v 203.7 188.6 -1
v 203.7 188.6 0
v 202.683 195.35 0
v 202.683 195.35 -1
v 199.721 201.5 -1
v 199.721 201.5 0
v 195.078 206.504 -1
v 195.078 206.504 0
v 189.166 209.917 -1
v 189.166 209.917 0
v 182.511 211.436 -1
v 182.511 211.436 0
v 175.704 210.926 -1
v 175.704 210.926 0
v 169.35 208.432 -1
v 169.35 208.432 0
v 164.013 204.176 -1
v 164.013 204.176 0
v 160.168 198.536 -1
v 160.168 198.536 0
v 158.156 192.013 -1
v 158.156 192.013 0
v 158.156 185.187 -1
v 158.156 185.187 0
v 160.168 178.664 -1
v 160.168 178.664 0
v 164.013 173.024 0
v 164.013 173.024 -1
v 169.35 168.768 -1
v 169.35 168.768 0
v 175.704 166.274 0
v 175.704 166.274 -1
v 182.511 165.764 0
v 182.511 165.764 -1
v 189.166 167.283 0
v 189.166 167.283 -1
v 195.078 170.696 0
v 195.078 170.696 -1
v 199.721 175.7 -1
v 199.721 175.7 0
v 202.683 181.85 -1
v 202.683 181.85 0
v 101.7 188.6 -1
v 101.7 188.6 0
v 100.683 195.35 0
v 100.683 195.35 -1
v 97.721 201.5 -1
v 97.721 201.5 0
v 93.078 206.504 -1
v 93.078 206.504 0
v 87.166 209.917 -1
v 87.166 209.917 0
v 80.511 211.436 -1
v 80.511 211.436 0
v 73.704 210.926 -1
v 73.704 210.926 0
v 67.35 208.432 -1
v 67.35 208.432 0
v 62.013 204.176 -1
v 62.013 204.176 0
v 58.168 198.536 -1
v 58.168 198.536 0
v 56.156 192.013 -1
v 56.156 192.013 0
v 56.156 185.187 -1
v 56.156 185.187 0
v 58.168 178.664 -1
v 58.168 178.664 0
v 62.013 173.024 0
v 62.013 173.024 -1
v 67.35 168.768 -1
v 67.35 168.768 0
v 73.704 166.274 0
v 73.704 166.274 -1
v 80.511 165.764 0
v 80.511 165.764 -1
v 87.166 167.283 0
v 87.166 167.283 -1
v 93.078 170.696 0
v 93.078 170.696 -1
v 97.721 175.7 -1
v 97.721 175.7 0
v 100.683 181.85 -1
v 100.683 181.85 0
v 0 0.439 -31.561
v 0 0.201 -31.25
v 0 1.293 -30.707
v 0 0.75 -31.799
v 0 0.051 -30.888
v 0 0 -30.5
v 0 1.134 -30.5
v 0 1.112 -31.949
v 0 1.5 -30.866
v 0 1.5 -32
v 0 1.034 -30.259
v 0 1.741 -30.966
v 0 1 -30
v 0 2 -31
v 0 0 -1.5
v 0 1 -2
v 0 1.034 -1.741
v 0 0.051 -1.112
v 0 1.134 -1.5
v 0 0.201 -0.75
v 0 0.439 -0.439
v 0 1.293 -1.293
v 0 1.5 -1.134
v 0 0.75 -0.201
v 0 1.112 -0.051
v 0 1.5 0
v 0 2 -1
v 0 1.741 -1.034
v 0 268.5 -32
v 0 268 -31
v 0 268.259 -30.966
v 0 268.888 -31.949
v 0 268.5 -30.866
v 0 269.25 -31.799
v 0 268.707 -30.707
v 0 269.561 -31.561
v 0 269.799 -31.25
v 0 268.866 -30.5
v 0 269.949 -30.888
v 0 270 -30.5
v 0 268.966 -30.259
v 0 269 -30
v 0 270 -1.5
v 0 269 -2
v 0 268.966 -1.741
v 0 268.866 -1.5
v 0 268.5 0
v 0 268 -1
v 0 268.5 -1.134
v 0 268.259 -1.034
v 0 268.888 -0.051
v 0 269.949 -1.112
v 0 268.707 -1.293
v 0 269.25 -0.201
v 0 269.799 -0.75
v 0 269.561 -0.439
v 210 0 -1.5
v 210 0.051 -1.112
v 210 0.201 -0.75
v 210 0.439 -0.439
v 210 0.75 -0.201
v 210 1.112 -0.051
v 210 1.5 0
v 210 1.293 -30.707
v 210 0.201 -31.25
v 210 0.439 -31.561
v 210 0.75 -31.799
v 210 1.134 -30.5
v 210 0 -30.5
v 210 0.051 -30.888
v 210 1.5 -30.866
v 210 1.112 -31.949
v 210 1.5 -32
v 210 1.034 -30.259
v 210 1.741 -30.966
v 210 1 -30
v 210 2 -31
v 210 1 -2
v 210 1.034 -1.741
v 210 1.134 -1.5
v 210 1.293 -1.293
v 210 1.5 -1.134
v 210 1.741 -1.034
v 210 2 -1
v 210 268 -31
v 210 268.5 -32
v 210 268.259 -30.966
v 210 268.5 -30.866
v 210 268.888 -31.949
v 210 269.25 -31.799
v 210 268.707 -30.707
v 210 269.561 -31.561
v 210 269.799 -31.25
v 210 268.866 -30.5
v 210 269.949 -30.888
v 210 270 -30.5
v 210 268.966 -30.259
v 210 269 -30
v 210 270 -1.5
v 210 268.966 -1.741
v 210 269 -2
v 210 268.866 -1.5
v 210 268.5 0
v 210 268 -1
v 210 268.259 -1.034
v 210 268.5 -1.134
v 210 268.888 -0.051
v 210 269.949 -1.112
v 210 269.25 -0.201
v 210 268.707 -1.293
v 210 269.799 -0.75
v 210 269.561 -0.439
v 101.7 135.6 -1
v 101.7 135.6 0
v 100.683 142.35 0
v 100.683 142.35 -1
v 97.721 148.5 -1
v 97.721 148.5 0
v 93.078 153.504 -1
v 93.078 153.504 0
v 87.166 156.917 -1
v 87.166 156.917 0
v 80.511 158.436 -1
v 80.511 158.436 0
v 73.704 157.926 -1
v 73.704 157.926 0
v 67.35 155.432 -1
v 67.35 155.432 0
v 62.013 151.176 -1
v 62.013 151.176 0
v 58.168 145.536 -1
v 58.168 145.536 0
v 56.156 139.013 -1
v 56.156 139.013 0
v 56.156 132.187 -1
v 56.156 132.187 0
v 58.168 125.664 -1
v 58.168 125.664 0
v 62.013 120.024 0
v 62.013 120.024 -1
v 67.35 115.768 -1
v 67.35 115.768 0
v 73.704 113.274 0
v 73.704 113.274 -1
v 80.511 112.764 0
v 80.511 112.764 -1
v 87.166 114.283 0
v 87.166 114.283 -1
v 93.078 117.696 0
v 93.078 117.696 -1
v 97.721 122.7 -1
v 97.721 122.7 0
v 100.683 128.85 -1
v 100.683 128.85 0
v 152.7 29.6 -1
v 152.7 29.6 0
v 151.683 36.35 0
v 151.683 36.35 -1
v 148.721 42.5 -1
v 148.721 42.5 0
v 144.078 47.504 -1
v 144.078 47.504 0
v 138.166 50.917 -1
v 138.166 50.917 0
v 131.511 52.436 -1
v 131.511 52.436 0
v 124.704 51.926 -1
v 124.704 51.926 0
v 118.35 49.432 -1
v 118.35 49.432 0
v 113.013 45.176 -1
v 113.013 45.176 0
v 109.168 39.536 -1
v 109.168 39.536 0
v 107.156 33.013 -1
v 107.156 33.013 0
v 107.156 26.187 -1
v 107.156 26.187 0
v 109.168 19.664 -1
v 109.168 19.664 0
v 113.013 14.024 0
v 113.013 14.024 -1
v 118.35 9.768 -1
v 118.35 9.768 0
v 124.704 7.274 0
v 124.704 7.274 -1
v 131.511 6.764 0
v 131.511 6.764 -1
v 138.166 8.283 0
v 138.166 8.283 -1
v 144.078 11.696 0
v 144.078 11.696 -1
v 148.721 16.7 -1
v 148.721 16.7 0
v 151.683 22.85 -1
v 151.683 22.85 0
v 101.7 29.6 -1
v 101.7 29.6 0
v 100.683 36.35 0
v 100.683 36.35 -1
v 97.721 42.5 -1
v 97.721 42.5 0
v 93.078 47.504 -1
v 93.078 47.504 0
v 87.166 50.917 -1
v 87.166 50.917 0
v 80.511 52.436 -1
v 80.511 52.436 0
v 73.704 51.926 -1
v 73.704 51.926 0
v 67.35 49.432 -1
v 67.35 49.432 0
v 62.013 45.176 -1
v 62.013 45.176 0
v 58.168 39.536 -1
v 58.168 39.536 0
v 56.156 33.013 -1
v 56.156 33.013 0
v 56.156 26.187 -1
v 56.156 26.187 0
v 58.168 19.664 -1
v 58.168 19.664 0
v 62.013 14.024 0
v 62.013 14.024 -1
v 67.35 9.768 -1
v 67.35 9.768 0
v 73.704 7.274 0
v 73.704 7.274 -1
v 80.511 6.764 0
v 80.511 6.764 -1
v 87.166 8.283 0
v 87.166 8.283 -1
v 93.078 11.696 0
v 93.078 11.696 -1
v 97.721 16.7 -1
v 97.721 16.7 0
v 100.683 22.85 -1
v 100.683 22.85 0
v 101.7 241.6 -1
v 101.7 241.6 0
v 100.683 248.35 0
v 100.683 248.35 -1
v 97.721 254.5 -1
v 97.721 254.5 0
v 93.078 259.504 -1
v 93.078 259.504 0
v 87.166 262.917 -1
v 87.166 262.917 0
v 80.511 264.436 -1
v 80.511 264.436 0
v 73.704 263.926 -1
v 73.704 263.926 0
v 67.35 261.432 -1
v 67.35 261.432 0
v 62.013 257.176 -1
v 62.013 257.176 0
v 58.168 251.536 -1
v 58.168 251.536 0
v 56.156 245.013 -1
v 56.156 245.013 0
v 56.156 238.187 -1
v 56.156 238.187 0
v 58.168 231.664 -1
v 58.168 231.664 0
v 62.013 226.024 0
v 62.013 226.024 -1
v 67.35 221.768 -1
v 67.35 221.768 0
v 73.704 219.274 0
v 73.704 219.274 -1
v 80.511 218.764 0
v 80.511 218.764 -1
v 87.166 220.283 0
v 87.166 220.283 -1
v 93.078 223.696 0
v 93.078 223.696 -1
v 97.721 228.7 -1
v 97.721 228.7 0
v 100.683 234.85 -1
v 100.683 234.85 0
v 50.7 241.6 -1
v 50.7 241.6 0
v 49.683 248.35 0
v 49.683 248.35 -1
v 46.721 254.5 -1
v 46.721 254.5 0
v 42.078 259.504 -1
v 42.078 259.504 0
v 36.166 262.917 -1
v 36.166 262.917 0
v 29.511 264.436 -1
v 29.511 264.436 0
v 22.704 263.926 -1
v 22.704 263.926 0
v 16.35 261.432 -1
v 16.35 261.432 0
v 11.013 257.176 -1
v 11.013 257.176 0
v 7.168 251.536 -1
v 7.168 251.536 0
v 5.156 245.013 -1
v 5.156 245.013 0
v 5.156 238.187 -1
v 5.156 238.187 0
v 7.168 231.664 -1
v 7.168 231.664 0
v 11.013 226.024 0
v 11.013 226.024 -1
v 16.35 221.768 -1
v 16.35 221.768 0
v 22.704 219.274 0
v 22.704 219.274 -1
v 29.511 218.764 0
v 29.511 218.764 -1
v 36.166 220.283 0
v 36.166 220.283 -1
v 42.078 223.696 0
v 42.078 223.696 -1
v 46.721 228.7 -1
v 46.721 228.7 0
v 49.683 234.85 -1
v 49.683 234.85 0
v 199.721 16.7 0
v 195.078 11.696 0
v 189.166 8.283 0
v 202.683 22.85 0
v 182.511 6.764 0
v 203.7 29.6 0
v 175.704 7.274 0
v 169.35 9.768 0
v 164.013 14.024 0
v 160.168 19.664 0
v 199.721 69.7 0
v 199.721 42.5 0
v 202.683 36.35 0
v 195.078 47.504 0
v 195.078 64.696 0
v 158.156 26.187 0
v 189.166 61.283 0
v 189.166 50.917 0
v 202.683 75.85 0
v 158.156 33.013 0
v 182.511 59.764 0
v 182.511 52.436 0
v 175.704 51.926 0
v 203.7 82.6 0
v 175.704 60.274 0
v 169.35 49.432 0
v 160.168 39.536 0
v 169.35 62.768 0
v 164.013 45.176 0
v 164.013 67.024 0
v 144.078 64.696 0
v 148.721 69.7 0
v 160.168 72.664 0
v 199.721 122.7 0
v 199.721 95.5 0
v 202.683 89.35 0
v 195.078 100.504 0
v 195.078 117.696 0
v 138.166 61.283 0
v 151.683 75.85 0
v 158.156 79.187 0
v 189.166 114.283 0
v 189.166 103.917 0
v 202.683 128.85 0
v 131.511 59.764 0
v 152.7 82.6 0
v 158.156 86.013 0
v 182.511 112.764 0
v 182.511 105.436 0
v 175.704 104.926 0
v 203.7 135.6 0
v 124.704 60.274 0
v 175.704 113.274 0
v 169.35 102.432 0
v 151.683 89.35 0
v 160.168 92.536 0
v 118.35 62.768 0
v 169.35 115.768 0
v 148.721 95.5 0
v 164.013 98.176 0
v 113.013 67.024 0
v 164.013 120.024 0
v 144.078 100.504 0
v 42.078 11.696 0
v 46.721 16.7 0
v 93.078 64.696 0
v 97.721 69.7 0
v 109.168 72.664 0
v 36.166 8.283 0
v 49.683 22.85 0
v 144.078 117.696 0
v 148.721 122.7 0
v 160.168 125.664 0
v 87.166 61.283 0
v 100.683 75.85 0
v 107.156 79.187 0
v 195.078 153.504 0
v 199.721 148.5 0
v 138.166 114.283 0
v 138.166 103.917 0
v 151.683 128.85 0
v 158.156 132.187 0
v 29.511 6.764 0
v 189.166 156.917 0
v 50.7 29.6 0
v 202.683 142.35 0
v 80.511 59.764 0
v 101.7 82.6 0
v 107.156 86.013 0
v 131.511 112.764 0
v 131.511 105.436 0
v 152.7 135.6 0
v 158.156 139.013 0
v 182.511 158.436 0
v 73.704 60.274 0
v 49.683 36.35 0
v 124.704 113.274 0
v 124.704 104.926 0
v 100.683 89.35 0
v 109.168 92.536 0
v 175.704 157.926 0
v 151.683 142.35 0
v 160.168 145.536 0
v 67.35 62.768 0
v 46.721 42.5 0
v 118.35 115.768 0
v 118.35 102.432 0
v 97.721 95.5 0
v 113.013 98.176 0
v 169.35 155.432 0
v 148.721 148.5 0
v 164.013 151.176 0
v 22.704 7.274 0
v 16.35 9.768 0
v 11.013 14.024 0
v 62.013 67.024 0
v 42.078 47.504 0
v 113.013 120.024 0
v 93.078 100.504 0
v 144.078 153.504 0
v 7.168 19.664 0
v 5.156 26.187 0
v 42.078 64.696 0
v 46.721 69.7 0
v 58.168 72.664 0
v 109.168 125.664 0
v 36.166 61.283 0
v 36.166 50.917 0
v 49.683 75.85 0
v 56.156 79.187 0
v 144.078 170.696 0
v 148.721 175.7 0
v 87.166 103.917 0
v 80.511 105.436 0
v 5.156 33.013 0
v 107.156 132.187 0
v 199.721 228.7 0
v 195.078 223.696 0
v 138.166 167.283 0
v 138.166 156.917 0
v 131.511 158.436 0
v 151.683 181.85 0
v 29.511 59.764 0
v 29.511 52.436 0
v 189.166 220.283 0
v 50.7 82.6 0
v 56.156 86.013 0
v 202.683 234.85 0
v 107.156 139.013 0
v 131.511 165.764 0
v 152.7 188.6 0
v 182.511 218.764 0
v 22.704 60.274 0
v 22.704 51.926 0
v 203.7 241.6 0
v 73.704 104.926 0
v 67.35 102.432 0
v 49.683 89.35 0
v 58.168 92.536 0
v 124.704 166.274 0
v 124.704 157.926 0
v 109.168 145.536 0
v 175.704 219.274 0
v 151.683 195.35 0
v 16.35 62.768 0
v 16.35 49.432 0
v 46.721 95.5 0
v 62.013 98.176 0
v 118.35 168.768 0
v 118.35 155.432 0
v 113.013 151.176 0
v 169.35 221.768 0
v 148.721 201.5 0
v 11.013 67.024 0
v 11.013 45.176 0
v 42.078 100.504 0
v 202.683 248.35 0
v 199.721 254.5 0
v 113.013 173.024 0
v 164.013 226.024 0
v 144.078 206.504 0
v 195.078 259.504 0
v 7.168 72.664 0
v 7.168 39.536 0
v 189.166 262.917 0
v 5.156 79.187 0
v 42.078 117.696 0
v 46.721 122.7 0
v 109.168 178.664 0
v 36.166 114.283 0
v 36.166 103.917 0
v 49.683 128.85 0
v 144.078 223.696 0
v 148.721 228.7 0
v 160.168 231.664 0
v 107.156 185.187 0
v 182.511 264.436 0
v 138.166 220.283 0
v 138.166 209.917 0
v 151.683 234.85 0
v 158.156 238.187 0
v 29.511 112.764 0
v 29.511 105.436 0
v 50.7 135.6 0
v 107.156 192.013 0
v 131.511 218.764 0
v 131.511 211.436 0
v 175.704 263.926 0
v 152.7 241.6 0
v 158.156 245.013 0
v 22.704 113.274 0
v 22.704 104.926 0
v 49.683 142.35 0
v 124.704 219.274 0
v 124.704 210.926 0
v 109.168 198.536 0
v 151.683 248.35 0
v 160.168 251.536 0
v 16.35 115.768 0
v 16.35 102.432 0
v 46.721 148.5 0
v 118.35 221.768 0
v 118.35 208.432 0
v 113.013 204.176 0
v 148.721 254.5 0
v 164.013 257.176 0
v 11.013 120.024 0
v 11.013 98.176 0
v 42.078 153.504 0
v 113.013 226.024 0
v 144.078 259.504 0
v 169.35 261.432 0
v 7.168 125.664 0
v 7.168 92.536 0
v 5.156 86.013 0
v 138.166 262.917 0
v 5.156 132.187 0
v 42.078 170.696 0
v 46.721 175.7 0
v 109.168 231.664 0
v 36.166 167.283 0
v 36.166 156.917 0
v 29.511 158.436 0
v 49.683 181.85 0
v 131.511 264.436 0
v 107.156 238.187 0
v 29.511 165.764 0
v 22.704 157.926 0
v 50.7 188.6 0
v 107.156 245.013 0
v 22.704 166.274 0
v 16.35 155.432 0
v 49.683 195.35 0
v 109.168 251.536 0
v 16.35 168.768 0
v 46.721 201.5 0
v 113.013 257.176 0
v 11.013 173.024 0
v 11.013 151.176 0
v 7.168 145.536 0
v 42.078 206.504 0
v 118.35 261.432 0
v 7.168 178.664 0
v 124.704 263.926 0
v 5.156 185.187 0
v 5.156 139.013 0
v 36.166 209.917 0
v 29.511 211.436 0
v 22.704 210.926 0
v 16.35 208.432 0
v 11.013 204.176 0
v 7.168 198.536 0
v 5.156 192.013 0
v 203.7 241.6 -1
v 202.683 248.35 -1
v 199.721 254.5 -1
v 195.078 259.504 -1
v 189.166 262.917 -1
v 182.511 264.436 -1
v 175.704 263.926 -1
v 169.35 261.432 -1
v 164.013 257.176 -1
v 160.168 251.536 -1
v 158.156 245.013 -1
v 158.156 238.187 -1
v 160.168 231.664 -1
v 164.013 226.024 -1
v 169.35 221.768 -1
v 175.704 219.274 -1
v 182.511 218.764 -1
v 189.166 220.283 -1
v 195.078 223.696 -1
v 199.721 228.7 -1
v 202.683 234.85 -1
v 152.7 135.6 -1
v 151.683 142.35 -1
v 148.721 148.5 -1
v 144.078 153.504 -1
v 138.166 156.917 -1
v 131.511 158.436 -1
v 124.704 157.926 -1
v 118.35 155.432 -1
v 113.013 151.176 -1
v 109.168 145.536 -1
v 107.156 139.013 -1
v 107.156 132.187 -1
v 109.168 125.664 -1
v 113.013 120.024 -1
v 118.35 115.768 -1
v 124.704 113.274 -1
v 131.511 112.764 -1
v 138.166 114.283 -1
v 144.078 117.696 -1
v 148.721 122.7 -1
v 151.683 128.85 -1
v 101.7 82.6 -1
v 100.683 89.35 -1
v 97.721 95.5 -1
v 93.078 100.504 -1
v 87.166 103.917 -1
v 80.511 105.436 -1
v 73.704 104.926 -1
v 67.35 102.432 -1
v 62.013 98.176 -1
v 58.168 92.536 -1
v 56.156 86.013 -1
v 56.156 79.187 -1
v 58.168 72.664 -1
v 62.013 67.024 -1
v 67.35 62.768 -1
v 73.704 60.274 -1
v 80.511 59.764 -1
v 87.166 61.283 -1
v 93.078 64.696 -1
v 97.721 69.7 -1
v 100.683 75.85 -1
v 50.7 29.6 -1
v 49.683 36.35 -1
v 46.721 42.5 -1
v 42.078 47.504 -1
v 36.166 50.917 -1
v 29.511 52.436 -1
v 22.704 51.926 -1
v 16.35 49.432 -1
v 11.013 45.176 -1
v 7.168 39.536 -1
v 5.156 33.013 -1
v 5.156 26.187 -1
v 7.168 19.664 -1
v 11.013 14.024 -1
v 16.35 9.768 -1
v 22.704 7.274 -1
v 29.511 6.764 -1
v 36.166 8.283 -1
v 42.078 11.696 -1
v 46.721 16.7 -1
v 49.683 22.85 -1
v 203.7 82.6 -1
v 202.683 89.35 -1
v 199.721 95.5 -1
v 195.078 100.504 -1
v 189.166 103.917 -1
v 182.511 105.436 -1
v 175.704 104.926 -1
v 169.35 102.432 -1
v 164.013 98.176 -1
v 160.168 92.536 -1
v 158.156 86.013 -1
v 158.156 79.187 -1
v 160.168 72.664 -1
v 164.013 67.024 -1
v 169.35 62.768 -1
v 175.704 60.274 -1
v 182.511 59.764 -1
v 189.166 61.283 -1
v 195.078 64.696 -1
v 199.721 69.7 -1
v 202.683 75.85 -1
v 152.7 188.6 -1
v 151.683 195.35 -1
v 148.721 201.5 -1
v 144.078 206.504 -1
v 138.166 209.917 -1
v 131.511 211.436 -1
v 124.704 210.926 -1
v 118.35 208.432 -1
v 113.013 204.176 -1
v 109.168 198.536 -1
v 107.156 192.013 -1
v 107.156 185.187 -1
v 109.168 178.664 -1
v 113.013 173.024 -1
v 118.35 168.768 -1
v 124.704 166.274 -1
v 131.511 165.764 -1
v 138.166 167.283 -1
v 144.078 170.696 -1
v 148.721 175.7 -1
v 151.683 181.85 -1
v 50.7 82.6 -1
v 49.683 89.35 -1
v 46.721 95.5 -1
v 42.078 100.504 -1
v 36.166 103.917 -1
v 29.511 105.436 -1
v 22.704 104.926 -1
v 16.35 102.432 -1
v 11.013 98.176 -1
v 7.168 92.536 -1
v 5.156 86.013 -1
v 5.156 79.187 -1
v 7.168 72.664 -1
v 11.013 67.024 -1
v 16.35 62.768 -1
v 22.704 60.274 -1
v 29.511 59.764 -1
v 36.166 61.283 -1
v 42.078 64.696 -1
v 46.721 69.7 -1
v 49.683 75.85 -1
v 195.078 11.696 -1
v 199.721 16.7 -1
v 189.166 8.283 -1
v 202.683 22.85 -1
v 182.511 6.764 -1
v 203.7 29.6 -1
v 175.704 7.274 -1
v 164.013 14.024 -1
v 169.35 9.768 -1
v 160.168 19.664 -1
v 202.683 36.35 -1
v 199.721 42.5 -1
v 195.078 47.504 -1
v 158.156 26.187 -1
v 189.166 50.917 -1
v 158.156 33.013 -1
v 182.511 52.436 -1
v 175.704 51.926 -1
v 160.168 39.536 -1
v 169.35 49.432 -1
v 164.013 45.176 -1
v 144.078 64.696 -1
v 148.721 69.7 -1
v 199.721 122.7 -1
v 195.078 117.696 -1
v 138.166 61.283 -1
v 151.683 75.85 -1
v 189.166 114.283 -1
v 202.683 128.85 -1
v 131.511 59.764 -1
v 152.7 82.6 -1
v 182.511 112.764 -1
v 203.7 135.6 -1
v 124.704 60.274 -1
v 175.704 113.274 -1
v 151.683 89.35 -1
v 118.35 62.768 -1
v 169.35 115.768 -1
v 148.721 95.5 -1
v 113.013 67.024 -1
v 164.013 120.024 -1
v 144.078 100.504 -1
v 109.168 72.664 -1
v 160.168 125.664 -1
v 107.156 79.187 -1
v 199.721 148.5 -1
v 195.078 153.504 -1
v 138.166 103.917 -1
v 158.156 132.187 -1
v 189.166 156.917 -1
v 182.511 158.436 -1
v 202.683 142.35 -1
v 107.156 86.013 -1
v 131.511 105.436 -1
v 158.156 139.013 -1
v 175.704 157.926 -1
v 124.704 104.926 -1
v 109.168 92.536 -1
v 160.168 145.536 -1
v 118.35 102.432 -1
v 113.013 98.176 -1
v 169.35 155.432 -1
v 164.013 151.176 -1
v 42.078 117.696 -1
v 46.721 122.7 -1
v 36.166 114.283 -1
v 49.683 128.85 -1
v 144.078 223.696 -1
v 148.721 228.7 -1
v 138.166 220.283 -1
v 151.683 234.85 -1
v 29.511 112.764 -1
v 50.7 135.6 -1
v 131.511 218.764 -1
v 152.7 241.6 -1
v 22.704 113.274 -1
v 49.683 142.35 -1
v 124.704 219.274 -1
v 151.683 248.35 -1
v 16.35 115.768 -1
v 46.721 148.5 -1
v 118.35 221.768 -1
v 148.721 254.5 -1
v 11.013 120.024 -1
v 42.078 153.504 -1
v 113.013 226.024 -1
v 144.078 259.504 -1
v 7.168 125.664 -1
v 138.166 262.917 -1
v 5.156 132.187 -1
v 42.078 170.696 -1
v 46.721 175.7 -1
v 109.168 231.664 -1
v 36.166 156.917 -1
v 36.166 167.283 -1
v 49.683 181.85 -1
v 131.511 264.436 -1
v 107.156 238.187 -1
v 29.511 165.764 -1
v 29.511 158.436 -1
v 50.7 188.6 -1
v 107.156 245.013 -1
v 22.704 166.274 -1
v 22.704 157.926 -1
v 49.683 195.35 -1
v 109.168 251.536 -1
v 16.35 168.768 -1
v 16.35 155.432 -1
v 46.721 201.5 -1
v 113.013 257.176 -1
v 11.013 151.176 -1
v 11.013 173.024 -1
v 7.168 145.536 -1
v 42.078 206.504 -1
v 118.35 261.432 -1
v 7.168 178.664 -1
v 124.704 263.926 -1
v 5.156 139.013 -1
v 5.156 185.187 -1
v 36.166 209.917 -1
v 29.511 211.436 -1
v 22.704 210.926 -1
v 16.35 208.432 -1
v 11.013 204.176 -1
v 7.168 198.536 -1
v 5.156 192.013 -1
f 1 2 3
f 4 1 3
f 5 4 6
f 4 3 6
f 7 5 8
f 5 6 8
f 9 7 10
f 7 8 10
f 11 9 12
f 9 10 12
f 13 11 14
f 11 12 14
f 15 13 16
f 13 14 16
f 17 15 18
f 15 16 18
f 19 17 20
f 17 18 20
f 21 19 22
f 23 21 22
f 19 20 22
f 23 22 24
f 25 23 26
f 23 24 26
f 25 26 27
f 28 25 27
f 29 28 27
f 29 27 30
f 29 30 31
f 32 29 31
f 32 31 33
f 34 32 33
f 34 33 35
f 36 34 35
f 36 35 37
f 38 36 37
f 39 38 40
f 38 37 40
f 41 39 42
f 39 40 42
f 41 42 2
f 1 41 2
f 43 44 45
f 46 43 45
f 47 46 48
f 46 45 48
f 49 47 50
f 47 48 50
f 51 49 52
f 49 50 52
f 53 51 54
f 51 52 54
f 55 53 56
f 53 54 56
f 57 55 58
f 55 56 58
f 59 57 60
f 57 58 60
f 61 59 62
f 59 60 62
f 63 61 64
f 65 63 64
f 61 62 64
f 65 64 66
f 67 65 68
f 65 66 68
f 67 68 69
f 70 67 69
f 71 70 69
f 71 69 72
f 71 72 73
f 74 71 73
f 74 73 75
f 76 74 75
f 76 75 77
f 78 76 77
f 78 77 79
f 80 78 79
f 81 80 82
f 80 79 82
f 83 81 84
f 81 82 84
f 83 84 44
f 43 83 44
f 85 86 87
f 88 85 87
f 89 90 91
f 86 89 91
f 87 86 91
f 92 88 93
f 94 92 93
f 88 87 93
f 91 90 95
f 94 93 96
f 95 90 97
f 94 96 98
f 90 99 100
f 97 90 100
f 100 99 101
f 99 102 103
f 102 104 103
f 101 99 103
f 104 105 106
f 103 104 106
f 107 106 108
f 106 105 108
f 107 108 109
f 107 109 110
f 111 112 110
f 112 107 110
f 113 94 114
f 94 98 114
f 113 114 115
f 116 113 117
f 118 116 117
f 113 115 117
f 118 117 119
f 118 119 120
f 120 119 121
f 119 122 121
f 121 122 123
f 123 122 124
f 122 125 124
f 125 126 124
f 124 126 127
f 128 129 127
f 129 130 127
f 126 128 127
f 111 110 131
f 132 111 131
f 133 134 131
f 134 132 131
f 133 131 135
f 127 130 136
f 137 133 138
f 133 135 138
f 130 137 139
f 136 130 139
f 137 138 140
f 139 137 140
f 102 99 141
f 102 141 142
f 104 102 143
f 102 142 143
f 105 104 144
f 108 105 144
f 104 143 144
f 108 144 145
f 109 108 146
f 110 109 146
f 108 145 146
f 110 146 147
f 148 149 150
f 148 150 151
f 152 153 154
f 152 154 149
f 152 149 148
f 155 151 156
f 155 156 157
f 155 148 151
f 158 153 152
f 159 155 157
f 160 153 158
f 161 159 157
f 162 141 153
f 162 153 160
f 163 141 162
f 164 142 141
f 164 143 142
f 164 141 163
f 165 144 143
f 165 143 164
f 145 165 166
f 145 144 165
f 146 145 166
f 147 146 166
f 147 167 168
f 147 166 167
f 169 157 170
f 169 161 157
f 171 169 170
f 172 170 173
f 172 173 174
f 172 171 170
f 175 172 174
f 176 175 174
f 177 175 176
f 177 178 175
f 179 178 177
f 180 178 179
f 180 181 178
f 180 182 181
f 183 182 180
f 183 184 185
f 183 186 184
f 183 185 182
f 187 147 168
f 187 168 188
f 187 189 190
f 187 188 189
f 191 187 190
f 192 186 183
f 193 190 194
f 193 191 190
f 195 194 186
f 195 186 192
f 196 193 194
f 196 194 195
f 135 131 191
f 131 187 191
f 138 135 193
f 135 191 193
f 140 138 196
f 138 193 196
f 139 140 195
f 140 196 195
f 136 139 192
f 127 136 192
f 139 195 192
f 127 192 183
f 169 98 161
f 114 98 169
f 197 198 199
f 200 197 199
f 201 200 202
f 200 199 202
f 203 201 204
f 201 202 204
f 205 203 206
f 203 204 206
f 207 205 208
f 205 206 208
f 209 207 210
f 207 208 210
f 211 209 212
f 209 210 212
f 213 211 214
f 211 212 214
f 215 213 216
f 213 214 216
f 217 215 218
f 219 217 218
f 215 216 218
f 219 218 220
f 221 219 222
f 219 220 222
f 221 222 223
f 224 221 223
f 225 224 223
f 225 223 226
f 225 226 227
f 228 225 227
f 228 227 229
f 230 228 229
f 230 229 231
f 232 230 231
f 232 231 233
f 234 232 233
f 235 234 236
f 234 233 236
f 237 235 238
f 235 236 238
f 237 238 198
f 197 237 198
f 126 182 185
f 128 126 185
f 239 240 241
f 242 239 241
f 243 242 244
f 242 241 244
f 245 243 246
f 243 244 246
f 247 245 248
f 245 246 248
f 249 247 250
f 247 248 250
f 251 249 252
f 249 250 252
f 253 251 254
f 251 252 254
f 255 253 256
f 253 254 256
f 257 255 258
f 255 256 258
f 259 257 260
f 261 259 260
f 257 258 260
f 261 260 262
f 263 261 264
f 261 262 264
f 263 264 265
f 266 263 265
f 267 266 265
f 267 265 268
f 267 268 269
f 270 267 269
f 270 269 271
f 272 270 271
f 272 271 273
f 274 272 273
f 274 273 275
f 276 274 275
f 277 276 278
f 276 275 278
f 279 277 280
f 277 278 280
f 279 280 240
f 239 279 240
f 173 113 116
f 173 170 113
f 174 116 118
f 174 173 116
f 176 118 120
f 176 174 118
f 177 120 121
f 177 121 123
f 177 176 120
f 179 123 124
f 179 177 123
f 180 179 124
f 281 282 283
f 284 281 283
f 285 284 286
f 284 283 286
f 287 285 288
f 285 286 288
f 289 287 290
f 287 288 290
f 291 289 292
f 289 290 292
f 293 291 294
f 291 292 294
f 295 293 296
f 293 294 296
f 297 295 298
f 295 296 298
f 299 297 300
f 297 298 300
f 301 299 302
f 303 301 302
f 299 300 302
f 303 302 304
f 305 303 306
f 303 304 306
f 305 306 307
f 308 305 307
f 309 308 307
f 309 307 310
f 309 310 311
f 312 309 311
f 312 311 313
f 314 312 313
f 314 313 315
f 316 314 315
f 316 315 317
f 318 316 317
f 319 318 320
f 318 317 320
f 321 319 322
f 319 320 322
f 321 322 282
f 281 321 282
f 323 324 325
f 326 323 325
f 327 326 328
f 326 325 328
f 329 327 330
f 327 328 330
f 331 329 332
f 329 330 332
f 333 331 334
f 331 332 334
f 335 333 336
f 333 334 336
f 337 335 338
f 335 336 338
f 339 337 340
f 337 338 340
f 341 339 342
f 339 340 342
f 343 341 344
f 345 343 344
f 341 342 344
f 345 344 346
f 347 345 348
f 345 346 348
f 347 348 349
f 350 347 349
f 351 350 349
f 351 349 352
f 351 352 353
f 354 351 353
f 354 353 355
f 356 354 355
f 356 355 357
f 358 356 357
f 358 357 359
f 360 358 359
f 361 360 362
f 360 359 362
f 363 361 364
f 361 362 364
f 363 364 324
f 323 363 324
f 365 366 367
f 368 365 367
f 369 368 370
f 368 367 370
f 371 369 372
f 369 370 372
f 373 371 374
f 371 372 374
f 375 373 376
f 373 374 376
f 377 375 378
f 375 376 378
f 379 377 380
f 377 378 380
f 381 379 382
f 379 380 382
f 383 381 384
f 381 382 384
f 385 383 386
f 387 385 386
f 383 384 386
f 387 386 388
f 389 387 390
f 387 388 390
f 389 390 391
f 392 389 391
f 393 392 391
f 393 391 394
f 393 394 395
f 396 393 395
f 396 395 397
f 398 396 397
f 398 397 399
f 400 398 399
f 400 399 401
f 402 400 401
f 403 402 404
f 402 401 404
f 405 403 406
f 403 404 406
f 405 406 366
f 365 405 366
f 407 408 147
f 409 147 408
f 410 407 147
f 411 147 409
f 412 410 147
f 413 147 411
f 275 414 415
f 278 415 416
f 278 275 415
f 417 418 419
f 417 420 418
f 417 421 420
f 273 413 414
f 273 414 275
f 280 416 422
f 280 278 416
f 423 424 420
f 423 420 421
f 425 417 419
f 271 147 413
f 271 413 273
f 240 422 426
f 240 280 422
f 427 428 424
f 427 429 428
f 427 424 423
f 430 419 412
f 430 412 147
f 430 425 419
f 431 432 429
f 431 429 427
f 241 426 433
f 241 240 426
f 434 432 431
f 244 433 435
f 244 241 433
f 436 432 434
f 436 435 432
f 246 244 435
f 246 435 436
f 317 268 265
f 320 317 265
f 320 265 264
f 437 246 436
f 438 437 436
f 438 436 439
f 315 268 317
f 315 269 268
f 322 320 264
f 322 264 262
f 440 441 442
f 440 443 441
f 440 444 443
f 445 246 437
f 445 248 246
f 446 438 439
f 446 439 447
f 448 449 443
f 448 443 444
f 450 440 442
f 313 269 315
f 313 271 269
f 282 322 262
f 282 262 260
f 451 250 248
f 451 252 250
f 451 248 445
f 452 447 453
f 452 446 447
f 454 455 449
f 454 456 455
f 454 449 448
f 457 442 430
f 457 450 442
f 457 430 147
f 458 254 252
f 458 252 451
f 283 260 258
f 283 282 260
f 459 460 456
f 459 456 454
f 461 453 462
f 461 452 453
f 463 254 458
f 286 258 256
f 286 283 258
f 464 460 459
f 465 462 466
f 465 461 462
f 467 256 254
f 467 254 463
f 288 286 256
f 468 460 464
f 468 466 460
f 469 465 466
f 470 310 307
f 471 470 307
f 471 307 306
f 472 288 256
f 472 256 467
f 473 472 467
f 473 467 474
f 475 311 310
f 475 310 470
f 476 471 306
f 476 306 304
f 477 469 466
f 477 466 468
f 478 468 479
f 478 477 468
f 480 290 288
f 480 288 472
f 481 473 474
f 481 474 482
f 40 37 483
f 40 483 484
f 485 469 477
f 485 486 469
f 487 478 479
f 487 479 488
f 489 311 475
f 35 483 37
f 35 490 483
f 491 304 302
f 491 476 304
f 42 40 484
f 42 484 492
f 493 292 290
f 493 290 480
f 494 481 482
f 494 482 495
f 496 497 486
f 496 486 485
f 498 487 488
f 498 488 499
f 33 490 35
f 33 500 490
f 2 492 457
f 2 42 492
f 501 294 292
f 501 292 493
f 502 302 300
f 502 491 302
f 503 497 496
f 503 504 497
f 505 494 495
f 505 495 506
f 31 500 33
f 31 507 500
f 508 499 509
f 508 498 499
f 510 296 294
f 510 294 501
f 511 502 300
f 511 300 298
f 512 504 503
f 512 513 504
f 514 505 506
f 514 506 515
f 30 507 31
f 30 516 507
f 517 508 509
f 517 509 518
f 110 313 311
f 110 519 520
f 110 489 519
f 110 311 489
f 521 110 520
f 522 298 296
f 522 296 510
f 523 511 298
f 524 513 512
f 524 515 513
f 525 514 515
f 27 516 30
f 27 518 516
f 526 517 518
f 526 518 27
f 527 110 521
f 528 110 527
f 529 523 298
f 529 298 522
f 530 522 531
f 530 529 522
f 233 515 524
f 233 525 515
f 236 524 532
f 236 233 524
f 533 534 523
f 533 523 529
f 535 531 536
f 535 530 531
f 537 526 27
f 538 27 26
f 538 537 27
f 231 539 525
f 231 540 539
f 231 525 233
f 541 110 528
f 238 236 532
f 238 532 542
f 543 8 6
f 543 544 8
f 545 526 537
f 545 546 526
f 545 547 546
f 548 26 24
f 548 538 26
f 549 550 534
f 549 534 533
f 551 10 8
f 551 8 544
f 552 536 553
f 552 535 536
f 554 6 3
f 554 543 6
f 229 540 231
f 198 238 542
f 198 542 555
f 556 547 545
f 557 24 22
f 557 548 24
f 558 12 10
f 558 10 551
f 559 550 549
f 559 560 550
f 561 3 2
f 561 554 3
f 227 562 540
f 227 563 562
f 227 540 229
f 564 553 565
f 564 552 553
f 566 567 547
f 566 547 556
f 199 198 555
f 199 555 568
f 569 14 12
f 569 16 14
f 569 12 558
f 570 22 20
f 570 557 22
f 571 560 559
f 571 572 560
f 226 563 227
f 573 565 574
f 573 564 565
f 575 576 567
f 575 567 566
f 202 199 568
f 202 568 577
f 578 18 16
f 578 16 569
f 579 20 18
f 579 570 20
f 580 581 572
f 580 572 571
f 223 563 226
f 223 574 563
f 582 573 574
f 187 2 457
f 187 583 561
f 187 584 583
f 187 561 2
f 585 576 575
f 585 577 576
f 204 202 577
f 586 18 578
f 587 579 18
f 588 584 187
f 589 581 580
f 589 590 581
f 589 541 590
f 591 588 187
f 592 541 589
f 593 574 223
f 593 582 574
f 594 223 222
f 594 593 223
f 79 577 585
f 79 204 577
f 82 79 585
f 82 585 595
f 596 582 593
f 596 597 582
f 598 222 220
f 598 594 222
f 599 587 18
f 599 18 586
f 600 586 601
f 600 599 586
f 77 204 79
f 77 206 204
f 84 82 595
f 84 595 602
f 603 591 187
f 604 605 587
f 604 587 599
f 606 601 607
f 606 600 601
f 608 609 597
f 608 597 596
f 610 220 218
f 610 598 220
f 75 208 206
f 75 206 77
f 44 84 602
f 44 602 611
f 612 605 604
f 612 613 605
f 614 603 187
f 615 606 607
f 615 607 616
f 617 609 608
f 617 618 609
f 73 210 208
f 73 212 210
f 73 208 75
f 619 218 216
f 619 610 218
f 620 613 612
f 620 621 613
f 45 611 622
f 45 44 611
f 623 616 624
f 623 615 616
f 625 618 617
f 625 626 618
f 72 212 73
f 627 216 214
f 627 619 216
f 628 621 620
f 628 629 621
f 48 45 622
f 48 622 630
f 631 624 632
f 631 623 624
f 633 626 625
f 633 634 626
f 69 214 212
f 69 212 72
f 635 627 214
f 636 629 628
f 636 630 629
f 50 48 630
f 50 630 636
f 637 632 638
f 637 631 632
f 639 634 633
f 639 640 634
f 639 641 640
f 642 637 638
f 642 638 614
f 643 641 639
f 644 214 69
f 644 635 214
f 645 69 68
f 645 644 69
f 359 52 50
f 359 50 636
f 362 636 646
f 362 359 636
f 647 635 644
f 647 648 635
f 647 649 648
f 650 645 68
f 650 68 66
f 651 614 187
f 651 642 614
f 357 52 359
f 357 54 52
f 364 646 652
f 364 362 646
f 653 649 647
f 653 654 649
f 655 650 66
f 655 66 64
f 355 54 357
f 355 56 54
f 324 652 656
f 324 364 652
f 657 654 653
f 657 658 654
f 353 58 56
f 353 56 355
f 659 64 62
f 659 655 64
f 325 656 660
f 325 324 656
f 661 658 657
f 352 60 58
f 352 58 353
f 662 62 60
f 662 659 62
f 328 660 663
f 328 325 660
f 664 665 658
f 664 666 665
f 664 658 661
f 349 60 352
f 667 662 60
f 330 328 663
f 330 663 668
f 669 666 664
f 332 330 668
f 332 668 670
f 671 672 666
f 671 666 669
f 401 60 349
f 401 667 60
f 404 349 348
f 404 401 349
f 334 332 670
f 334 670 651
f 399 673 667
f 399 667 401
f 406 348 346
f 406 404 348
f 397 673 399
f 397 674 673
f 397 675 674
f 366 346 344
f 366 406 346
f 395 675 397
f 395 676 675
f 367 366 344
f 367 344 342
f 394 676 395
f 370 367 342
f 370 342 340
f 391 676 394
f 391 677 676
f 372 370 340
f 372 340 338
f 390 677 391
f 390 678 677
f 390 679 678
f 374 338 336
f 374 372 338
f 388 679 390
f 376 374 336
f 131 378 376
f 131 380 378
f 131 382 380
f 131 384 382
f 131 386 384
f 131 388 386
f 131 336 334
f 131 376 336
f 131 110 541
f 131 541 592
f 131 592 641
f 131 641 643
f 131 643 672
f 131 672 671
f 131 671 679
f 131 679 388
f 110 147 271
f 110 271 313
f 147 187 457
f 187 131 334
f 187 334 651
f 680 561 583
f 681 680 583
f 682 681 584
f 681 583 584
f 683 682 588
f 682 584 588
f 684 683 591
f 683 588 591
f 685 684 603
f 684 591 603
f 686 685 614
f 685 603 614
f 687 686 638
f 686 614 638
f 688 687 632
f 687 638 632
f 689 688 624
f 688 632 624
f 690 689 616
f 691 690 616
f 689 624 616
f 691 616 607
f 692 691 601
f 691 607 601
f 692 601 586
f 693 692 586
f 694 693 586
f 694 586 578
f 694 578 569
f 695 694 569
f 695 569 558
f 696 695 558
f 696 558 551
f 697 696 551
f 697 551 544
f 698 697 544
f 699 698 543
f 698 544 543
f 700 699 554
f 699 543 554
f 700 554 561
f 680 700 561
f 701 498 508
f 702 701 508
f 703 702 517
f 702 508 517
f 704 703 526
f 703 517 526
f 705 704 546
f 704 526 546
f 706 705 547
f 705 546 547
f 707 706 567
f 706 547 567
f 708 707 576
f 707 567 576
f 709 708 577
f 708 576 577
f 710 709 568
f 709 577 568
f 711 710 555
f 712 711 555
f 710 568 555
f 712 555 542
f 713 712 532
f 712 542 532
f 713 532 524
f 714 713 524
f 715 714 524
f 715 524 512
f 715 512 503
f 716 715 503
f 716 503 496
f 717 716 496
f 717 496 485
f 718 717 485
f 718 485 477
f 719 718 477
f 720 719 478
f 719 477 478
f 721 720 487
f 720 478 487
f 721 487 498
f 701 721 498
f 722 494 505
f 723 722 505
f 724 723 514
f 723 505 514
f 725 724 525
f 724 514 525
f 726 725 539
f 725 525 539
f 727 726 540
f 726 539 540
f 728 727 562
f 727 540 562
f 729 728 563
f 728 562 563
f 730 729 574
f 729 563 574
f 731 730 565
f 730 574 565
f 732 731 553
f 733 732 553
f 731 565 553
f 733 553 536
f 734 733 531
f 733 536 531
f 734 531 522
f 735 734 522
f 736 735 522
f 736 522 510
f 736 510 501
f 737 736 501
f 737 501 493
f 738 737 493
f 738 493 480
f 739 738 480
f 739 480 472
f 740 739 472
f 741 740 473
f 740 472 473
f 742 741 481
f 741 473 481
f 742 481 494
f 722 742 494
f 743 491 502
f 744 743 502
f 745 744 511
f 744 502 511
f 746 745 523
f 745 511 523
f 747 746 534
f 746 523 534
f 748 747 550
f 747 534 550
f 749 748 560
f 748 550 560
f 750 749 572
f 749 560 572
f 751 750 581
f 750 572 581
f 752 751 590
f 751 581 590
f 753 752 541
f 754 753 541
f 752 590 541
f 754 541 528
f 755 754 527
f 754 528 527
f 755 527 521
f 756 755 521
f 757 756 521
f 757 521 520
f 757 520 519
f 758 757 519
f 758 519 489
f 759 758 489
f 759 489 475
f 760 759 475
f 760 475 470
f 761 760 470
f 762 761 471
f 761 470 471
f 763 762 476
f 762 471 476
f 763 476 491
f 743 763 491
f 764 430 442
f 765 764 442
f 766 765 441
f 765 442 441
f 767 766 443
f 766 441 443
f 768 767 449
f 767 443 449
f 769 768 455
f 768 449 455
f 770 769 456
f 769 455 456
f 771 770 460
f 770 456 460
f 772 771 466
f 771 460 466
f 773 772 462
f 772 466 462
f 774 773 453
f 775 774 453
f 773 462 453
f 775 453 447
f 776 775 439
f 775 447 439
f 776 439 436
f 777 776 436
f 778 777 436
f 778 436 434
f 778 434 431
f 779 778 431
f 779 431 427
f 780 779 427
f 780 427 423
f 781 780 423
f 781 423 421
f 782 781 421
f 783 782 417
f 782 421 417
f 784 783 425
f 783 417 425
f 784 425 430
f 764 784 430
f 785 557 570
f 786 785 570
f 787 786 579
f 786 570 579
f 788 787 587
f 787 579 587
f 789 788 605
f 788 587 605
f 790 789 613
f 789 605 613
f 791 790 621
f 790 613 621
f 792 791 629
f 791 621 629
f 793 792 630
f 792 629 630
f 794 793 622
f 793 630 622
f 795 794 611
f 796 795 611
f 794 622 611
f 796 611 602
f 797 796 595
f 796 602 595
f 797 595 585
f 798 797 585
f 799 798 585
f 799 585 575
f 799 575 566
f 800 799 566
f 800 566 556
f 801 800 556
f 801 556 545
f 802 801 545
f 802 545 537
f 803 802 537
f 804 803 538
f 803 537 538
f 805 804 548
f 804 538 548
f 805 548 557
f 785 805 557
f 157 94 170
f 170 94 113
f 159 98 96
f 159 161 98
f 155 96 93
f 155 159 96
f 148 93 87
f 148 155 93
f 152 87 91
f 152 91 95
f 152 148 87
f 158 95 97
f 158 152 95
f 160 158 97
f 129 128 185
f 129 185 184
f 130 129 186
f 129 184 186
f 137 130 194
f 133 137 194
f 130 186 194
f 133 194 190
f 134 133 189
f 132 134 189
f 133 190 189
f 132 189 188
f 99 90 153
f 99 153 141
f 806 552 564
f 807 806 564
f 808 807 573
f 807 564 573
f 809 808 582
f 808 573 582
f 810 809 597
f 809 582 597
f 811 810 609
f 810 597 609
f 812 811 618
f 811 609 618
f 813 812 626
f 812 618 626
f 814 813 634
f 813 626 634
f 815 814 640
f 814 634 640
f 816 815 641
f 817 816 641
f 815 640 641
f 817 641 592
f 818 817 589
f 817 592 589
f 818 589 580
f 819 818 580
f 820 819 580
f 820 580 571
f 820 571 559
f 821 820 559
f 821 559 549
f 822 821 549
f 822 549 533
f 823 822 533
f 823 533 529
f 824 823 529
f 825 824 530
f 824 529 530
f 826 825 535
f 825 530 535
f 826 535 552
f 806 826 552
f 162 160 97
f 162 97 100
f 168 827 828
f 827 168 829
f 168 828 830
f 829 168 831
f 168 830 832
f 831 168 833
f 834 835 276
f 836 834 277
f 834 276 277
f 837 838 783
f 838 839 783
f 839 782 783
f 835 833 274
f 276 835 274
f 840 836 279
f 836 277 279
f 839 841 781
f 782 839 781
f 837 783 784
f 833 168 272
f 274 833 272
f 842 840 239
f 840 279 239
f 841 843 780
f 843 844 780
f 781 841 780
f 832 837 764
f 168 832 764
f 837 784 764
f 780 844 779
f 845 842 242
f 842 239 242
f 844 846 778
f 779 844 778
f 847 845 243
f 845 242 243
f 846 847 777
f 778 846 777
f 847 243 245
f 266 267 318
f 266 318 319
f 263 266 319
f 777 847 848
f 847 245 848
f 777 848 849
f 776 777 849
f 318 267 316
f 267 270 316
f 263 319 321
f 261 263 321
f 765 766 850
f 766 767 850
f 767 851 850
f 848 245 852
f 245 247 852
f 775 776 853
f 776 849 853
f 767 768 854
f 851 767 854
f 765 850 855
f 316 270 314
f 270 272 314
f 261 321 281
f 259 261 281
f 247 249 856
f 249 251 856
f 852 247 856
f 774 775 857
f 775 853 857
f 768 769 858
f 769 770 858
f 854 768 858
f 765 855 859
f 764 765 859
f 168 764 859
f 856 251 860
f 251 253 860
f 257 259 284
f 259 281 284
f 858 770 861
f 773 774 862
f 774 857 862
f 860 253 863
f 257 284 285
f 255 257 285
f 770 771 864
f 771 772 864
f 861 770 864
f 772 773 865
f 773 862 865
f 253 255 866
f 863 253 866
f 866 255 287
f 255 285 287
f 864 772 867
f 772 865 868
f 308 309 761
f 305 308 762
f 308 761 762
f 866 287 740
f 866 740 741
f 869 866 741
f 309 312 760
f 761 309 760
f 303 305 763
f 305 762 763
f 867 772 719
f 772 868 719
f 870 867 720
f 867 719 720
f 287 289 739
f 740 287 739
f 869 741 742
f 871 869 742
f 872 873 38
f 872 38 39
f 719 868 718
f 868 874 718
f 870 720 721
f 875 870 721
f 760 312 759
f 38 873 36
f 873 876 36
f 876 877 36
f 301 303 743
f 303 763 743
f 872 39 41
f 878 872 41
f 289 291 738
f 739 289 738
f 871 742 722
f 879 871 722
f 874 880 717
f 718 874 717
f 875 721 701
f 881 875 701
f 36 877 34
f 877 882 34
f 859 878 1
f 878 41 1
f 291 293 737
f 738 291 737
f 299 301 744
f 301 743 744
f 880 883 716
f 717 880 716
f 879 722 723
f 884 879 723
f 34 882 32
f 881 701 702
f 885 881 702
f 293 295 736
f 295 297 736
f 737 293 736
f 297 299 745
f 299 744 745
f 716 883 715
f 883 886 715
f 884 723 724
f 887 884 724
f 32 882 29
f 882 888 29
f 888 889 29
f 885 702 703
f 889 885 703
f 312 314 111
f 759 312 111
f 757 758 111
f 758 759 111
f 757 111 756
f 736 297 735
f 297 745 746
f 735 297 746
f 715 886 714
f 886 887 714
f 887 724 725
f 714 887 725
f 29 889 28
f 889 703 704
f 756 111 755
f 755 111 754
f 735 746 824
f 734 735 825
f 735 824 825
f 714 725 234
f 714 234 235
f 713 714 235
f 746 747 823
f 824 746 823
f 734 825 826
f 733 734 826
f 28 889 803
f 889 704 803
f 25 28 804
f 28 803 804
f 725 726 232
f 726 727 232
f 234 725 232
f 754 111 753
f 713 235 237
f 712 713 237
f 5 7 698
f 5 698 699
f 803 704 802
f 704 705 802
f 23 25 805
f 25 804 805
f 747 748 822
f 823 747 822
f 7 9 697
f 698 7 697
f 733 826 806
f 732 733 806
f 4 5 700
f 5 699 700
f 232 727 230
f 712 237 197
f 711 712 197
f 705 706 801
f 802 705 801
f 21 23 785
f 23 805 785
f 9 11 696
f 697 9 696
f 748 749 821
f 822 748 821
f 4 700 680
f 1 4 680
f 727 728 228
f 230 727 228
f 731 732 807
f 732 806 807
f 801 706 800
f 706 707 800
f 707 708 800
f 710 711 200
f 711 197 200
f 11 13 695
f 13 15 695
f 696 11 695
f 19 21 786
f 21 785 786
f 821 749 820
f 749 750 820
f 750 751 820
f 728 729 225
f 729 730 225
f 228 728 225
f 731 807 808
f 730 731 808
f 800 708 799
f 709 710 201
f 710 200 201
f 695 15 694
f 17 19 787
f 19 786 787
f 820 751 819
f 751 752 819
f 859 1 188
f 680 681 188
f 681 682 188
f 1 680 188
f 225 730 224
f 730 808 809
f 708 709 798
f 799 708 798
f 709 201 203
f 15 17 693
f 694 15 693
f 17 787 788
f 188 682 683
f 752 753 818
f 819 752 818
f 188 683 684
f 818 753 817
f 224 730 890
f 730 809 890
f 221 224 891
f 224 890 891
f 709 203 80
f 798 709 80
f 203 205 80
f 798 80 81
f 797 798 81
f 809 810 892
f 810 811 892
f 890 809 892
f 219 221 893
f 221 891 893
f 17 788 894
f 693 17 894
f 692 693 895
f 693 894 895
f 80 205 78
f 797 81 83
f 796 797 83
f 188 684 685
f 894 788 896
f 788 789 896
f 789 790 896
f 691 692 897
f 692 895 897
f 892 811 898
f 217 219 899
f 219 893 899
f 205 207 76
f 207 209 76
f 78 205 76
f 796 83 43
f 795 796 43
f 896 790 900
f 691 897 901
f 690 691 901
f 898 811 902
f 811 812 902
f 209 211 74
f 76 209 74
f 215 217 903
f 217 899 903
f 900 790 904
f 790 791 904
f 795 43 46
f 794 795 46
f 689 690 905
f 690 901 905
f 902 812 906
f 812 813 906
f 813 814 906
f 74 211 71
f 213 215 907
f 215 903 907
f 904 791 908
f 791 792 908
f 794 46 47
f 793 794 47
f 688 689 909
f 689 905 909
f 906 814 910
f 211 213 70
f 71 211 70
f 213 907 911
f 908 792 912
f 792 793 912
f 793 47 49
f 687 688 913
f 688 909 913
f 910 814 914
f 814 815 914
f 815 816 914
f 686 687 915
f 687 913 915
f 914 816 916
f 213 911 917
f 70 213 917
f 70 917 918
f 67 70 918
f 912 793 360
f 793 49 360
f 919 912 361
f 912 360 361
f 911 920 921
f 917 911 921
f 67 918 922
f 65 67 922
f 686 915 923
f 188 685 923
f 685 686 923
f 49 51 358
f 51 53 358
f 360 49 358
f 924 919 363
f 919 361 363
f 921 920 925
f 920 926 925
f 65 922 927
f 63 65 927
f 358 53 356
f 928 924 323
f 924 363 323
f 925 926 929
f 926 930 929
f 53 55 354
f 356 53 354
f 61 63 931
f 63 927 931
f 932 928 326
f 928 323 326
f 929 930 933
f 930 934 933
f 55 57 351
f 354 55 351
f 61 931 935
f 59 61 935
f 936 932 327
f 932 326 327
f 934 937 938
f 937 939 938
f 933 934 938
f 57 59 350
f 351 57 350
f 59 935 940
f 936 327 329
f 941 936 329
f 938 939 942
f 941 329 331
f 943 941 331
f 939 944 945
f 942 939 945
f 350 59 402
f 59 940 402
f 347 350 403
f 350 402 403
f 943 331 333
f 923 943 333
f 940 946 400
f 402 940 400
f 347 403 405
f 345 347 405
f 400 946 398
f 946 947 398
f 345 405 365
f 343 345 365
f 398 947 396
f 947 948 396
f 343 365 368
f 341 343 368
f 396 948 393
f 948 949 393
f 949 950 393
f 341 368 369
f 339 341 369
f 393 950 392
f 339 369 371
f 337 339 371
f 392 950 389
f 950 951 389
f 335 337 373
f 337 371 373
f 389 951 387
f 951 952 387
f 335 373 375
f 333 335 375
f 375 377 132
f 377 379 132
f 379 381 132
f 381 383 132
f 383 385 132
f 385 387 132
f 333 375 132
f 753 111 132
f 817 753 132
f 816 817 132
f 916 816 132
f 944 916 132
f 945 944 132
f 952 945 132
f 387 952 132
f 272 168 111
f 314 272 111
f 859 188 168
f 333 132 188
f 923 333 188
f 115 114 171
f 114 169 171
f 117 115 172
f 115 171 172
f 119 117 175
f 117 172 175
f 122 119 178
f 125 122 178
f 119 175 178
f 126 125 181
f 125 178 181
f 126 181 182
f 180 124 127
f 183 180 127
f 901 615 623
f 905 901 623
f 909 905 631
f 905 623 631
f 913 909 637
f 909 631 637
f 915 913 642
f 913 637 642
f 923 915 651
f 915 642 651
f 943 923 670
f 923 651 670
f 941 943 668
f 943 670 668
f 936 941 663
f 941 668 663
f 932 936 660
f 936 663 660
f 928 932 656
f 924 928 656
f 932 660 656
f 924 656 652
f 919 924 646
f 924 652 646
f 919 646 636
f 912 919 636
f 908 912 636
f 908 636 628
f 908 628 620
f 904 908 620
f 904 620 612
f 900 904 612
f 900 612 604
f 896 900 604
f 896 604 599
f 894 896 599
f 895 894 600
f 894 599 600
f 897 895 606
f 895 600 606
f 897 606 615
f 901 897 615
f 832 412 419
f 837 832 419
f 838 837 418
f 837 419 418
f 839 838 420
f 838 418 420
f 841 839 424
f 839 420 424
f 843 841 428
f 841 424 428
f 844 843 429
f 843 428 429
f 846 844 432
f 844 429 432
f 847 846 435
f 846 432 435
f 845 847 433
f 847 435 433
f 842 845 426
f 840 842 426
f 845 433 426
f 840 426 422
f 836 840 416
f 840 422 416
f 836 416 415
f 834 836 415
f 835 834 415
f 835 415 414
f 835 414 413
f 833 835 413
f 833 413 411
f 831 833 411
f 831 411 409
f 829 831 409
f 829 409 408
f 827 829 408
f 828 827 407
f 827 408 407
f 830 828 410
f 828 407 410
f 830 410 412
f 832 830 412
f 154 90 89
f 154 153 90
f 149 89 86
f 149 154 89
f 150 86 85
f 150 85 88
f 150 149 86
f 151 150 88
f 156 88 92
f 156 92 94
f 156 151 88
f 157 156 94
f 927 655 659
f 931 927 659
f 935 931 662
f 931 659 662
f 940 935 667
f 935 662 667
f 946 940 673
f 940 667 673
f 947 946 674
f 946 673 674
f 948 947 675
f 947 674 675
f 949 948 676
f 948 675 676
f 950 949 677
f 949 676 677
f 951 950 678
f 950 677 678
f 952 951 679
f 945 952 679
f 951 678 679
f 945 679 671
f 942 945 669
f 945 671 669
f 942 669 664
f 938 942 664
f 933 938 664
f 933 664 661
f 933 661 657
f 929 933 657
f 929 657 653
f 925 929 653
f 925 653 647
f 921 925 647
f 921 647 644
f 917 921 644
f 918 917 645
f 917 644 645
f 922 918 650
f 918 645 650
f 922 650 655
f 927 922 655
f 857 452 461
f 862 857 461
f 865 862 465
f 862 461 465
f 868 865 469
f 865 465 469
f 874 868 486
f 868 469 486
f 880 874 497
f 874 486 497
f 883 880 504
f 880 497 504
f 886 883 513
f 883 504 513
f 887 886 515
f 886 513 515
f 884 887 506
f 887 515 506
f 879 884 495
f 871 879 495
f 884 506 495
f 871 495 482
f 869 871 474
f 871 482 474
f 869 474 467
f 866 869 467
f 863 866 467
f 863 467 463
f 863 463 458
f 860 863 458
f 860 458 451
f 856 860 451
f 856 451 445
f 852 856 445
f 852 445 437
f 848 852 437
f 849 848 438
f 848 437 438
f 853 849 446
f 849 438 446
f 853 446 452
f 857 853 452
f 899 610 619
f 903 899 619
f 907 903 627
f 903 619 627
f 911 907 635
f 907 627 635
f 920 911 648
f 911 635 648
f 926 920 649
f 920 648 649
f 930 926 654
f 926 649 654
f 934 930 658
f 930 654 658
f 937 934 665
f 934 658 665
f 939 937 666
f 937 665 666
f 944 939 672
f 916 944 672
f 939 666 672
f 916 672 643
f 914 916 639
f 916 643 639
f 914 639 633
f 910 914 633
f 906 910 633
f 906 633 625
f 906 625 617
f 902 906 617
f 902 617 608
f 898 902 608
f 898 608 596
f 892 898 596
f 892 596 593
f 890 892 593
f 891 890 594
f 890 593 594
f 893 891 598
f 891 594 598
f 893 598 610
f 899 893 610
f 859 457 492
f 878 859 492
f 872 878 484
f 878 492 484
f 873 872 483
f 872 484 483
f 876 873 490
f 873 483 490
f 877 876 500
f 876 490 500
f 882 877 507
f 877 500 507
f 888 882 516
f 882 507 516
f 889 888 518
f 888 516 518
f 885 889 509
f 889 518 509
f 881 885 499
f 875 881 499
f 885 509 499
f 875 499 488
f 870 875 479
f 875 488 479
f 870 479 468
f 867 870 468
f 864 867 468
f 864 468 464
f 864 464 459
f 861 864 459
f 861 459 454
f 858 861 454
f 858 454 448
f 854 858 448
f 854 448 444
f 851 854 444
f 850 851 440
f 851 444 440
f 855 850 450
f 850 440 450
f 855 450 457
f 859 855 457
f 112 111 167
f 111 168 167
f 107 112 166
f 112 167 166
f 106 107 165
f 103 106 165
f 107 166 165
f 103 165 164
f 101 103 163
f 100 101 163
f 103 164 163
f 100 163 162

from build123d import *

# Parameters (mm, degrees)
F0_W     = 270
F0_H     = 32
F0_W_2   = 268
F0_H_2   = 30
F1_DEPTH = 210
F2_R     = 22.9
F3_DEPTH = 1
F4_R     = 1.5
F5_R     = 1


with BuildPart() as f1:
    # F0 (on Right) → F1 (new body)
    with BuildSketch(Plane.YZ):
        with Locations((135, -16)):
            Rectangle(F0_W, F0_H)
        with Locations((135, -16)):
            Rectangle(F0_W_2, F0_H_2, mode=Mode.SUBTRACT)
    extrude(amount=F1_DEPTH)

    # F2 (on face) → F3 (cut, through all)
    with BuildSketch(Plane.XY):
        with Locations((27.8, 29.6)):
            Circle(F2_R)
        with Locations((27.8, 82.6)):
            Circle(F2_R)
        with Locations((27.8, 135.6)):
            Circle(F2_R)
        with Locations((27.8, 188.6)):
            Circle(F2_R)
        with Locations((27.8, 241.6)):
            Circle(F2_R)
        with Locations((78.8, 29.6)):
            Circle(F2_R)
        with Locations((78.8, 82.6)):
            Circle(F2_R)
        with Locations((78.8, 135.6)):
            Circle(F2_R)
        with Locations((78.8, 188.6)):
            Circle(F2_R)
        with Locations((78.8, 241.6)):
            Circle(F2_R)
        with Locations((129.8, 29.6)):
            Circle(F2_R)
        with Locations((129.8, 82.6)):
            Circle(F2_R)
        with Locations((129.8, 135.6)):
            Circle(F2_R)
        with Locations((129.8, 188.6)):
            Circle(F2_R)
        with Locations((129.8, 241.6)):
            Circle(F2_R)
        with Locations((180.8, 29.6)):
            Circle(F2_R)
        with Locations((180.8, 82.6)):
            Circle(F2_R)
        with Locations((180.8, 135.6)):
            Circle(F2_R)
        with Locations((180.8, 188.6)):
            Circle(F2_R)
        with Locations((180.8, 241.6)):
            Circle(F2_R)
    extrude(amount=-F3_DEPTH, mode=Mode.SUBTRACT)

    # F4
    f4_edges = [f1.edges().sort_by_distance(p)[0] for p in [
        (105, 270, 0),
        (105, 270, -32),
        (105, 0, -32),
        (105, 0, 0),
    ]]
    fillet(f4_edges, radius=F4_R)

    # F5
    f5_edges = [f1.edges().sort_by_distance(p)[0] for p in [
        (105, 1, -1),
        (105, 1, -31),
        (105, 269, -31),
        (105, 269, -1),
    ]]
    fillet(f5_edges, radius=F5_R)


solid = f1.part
